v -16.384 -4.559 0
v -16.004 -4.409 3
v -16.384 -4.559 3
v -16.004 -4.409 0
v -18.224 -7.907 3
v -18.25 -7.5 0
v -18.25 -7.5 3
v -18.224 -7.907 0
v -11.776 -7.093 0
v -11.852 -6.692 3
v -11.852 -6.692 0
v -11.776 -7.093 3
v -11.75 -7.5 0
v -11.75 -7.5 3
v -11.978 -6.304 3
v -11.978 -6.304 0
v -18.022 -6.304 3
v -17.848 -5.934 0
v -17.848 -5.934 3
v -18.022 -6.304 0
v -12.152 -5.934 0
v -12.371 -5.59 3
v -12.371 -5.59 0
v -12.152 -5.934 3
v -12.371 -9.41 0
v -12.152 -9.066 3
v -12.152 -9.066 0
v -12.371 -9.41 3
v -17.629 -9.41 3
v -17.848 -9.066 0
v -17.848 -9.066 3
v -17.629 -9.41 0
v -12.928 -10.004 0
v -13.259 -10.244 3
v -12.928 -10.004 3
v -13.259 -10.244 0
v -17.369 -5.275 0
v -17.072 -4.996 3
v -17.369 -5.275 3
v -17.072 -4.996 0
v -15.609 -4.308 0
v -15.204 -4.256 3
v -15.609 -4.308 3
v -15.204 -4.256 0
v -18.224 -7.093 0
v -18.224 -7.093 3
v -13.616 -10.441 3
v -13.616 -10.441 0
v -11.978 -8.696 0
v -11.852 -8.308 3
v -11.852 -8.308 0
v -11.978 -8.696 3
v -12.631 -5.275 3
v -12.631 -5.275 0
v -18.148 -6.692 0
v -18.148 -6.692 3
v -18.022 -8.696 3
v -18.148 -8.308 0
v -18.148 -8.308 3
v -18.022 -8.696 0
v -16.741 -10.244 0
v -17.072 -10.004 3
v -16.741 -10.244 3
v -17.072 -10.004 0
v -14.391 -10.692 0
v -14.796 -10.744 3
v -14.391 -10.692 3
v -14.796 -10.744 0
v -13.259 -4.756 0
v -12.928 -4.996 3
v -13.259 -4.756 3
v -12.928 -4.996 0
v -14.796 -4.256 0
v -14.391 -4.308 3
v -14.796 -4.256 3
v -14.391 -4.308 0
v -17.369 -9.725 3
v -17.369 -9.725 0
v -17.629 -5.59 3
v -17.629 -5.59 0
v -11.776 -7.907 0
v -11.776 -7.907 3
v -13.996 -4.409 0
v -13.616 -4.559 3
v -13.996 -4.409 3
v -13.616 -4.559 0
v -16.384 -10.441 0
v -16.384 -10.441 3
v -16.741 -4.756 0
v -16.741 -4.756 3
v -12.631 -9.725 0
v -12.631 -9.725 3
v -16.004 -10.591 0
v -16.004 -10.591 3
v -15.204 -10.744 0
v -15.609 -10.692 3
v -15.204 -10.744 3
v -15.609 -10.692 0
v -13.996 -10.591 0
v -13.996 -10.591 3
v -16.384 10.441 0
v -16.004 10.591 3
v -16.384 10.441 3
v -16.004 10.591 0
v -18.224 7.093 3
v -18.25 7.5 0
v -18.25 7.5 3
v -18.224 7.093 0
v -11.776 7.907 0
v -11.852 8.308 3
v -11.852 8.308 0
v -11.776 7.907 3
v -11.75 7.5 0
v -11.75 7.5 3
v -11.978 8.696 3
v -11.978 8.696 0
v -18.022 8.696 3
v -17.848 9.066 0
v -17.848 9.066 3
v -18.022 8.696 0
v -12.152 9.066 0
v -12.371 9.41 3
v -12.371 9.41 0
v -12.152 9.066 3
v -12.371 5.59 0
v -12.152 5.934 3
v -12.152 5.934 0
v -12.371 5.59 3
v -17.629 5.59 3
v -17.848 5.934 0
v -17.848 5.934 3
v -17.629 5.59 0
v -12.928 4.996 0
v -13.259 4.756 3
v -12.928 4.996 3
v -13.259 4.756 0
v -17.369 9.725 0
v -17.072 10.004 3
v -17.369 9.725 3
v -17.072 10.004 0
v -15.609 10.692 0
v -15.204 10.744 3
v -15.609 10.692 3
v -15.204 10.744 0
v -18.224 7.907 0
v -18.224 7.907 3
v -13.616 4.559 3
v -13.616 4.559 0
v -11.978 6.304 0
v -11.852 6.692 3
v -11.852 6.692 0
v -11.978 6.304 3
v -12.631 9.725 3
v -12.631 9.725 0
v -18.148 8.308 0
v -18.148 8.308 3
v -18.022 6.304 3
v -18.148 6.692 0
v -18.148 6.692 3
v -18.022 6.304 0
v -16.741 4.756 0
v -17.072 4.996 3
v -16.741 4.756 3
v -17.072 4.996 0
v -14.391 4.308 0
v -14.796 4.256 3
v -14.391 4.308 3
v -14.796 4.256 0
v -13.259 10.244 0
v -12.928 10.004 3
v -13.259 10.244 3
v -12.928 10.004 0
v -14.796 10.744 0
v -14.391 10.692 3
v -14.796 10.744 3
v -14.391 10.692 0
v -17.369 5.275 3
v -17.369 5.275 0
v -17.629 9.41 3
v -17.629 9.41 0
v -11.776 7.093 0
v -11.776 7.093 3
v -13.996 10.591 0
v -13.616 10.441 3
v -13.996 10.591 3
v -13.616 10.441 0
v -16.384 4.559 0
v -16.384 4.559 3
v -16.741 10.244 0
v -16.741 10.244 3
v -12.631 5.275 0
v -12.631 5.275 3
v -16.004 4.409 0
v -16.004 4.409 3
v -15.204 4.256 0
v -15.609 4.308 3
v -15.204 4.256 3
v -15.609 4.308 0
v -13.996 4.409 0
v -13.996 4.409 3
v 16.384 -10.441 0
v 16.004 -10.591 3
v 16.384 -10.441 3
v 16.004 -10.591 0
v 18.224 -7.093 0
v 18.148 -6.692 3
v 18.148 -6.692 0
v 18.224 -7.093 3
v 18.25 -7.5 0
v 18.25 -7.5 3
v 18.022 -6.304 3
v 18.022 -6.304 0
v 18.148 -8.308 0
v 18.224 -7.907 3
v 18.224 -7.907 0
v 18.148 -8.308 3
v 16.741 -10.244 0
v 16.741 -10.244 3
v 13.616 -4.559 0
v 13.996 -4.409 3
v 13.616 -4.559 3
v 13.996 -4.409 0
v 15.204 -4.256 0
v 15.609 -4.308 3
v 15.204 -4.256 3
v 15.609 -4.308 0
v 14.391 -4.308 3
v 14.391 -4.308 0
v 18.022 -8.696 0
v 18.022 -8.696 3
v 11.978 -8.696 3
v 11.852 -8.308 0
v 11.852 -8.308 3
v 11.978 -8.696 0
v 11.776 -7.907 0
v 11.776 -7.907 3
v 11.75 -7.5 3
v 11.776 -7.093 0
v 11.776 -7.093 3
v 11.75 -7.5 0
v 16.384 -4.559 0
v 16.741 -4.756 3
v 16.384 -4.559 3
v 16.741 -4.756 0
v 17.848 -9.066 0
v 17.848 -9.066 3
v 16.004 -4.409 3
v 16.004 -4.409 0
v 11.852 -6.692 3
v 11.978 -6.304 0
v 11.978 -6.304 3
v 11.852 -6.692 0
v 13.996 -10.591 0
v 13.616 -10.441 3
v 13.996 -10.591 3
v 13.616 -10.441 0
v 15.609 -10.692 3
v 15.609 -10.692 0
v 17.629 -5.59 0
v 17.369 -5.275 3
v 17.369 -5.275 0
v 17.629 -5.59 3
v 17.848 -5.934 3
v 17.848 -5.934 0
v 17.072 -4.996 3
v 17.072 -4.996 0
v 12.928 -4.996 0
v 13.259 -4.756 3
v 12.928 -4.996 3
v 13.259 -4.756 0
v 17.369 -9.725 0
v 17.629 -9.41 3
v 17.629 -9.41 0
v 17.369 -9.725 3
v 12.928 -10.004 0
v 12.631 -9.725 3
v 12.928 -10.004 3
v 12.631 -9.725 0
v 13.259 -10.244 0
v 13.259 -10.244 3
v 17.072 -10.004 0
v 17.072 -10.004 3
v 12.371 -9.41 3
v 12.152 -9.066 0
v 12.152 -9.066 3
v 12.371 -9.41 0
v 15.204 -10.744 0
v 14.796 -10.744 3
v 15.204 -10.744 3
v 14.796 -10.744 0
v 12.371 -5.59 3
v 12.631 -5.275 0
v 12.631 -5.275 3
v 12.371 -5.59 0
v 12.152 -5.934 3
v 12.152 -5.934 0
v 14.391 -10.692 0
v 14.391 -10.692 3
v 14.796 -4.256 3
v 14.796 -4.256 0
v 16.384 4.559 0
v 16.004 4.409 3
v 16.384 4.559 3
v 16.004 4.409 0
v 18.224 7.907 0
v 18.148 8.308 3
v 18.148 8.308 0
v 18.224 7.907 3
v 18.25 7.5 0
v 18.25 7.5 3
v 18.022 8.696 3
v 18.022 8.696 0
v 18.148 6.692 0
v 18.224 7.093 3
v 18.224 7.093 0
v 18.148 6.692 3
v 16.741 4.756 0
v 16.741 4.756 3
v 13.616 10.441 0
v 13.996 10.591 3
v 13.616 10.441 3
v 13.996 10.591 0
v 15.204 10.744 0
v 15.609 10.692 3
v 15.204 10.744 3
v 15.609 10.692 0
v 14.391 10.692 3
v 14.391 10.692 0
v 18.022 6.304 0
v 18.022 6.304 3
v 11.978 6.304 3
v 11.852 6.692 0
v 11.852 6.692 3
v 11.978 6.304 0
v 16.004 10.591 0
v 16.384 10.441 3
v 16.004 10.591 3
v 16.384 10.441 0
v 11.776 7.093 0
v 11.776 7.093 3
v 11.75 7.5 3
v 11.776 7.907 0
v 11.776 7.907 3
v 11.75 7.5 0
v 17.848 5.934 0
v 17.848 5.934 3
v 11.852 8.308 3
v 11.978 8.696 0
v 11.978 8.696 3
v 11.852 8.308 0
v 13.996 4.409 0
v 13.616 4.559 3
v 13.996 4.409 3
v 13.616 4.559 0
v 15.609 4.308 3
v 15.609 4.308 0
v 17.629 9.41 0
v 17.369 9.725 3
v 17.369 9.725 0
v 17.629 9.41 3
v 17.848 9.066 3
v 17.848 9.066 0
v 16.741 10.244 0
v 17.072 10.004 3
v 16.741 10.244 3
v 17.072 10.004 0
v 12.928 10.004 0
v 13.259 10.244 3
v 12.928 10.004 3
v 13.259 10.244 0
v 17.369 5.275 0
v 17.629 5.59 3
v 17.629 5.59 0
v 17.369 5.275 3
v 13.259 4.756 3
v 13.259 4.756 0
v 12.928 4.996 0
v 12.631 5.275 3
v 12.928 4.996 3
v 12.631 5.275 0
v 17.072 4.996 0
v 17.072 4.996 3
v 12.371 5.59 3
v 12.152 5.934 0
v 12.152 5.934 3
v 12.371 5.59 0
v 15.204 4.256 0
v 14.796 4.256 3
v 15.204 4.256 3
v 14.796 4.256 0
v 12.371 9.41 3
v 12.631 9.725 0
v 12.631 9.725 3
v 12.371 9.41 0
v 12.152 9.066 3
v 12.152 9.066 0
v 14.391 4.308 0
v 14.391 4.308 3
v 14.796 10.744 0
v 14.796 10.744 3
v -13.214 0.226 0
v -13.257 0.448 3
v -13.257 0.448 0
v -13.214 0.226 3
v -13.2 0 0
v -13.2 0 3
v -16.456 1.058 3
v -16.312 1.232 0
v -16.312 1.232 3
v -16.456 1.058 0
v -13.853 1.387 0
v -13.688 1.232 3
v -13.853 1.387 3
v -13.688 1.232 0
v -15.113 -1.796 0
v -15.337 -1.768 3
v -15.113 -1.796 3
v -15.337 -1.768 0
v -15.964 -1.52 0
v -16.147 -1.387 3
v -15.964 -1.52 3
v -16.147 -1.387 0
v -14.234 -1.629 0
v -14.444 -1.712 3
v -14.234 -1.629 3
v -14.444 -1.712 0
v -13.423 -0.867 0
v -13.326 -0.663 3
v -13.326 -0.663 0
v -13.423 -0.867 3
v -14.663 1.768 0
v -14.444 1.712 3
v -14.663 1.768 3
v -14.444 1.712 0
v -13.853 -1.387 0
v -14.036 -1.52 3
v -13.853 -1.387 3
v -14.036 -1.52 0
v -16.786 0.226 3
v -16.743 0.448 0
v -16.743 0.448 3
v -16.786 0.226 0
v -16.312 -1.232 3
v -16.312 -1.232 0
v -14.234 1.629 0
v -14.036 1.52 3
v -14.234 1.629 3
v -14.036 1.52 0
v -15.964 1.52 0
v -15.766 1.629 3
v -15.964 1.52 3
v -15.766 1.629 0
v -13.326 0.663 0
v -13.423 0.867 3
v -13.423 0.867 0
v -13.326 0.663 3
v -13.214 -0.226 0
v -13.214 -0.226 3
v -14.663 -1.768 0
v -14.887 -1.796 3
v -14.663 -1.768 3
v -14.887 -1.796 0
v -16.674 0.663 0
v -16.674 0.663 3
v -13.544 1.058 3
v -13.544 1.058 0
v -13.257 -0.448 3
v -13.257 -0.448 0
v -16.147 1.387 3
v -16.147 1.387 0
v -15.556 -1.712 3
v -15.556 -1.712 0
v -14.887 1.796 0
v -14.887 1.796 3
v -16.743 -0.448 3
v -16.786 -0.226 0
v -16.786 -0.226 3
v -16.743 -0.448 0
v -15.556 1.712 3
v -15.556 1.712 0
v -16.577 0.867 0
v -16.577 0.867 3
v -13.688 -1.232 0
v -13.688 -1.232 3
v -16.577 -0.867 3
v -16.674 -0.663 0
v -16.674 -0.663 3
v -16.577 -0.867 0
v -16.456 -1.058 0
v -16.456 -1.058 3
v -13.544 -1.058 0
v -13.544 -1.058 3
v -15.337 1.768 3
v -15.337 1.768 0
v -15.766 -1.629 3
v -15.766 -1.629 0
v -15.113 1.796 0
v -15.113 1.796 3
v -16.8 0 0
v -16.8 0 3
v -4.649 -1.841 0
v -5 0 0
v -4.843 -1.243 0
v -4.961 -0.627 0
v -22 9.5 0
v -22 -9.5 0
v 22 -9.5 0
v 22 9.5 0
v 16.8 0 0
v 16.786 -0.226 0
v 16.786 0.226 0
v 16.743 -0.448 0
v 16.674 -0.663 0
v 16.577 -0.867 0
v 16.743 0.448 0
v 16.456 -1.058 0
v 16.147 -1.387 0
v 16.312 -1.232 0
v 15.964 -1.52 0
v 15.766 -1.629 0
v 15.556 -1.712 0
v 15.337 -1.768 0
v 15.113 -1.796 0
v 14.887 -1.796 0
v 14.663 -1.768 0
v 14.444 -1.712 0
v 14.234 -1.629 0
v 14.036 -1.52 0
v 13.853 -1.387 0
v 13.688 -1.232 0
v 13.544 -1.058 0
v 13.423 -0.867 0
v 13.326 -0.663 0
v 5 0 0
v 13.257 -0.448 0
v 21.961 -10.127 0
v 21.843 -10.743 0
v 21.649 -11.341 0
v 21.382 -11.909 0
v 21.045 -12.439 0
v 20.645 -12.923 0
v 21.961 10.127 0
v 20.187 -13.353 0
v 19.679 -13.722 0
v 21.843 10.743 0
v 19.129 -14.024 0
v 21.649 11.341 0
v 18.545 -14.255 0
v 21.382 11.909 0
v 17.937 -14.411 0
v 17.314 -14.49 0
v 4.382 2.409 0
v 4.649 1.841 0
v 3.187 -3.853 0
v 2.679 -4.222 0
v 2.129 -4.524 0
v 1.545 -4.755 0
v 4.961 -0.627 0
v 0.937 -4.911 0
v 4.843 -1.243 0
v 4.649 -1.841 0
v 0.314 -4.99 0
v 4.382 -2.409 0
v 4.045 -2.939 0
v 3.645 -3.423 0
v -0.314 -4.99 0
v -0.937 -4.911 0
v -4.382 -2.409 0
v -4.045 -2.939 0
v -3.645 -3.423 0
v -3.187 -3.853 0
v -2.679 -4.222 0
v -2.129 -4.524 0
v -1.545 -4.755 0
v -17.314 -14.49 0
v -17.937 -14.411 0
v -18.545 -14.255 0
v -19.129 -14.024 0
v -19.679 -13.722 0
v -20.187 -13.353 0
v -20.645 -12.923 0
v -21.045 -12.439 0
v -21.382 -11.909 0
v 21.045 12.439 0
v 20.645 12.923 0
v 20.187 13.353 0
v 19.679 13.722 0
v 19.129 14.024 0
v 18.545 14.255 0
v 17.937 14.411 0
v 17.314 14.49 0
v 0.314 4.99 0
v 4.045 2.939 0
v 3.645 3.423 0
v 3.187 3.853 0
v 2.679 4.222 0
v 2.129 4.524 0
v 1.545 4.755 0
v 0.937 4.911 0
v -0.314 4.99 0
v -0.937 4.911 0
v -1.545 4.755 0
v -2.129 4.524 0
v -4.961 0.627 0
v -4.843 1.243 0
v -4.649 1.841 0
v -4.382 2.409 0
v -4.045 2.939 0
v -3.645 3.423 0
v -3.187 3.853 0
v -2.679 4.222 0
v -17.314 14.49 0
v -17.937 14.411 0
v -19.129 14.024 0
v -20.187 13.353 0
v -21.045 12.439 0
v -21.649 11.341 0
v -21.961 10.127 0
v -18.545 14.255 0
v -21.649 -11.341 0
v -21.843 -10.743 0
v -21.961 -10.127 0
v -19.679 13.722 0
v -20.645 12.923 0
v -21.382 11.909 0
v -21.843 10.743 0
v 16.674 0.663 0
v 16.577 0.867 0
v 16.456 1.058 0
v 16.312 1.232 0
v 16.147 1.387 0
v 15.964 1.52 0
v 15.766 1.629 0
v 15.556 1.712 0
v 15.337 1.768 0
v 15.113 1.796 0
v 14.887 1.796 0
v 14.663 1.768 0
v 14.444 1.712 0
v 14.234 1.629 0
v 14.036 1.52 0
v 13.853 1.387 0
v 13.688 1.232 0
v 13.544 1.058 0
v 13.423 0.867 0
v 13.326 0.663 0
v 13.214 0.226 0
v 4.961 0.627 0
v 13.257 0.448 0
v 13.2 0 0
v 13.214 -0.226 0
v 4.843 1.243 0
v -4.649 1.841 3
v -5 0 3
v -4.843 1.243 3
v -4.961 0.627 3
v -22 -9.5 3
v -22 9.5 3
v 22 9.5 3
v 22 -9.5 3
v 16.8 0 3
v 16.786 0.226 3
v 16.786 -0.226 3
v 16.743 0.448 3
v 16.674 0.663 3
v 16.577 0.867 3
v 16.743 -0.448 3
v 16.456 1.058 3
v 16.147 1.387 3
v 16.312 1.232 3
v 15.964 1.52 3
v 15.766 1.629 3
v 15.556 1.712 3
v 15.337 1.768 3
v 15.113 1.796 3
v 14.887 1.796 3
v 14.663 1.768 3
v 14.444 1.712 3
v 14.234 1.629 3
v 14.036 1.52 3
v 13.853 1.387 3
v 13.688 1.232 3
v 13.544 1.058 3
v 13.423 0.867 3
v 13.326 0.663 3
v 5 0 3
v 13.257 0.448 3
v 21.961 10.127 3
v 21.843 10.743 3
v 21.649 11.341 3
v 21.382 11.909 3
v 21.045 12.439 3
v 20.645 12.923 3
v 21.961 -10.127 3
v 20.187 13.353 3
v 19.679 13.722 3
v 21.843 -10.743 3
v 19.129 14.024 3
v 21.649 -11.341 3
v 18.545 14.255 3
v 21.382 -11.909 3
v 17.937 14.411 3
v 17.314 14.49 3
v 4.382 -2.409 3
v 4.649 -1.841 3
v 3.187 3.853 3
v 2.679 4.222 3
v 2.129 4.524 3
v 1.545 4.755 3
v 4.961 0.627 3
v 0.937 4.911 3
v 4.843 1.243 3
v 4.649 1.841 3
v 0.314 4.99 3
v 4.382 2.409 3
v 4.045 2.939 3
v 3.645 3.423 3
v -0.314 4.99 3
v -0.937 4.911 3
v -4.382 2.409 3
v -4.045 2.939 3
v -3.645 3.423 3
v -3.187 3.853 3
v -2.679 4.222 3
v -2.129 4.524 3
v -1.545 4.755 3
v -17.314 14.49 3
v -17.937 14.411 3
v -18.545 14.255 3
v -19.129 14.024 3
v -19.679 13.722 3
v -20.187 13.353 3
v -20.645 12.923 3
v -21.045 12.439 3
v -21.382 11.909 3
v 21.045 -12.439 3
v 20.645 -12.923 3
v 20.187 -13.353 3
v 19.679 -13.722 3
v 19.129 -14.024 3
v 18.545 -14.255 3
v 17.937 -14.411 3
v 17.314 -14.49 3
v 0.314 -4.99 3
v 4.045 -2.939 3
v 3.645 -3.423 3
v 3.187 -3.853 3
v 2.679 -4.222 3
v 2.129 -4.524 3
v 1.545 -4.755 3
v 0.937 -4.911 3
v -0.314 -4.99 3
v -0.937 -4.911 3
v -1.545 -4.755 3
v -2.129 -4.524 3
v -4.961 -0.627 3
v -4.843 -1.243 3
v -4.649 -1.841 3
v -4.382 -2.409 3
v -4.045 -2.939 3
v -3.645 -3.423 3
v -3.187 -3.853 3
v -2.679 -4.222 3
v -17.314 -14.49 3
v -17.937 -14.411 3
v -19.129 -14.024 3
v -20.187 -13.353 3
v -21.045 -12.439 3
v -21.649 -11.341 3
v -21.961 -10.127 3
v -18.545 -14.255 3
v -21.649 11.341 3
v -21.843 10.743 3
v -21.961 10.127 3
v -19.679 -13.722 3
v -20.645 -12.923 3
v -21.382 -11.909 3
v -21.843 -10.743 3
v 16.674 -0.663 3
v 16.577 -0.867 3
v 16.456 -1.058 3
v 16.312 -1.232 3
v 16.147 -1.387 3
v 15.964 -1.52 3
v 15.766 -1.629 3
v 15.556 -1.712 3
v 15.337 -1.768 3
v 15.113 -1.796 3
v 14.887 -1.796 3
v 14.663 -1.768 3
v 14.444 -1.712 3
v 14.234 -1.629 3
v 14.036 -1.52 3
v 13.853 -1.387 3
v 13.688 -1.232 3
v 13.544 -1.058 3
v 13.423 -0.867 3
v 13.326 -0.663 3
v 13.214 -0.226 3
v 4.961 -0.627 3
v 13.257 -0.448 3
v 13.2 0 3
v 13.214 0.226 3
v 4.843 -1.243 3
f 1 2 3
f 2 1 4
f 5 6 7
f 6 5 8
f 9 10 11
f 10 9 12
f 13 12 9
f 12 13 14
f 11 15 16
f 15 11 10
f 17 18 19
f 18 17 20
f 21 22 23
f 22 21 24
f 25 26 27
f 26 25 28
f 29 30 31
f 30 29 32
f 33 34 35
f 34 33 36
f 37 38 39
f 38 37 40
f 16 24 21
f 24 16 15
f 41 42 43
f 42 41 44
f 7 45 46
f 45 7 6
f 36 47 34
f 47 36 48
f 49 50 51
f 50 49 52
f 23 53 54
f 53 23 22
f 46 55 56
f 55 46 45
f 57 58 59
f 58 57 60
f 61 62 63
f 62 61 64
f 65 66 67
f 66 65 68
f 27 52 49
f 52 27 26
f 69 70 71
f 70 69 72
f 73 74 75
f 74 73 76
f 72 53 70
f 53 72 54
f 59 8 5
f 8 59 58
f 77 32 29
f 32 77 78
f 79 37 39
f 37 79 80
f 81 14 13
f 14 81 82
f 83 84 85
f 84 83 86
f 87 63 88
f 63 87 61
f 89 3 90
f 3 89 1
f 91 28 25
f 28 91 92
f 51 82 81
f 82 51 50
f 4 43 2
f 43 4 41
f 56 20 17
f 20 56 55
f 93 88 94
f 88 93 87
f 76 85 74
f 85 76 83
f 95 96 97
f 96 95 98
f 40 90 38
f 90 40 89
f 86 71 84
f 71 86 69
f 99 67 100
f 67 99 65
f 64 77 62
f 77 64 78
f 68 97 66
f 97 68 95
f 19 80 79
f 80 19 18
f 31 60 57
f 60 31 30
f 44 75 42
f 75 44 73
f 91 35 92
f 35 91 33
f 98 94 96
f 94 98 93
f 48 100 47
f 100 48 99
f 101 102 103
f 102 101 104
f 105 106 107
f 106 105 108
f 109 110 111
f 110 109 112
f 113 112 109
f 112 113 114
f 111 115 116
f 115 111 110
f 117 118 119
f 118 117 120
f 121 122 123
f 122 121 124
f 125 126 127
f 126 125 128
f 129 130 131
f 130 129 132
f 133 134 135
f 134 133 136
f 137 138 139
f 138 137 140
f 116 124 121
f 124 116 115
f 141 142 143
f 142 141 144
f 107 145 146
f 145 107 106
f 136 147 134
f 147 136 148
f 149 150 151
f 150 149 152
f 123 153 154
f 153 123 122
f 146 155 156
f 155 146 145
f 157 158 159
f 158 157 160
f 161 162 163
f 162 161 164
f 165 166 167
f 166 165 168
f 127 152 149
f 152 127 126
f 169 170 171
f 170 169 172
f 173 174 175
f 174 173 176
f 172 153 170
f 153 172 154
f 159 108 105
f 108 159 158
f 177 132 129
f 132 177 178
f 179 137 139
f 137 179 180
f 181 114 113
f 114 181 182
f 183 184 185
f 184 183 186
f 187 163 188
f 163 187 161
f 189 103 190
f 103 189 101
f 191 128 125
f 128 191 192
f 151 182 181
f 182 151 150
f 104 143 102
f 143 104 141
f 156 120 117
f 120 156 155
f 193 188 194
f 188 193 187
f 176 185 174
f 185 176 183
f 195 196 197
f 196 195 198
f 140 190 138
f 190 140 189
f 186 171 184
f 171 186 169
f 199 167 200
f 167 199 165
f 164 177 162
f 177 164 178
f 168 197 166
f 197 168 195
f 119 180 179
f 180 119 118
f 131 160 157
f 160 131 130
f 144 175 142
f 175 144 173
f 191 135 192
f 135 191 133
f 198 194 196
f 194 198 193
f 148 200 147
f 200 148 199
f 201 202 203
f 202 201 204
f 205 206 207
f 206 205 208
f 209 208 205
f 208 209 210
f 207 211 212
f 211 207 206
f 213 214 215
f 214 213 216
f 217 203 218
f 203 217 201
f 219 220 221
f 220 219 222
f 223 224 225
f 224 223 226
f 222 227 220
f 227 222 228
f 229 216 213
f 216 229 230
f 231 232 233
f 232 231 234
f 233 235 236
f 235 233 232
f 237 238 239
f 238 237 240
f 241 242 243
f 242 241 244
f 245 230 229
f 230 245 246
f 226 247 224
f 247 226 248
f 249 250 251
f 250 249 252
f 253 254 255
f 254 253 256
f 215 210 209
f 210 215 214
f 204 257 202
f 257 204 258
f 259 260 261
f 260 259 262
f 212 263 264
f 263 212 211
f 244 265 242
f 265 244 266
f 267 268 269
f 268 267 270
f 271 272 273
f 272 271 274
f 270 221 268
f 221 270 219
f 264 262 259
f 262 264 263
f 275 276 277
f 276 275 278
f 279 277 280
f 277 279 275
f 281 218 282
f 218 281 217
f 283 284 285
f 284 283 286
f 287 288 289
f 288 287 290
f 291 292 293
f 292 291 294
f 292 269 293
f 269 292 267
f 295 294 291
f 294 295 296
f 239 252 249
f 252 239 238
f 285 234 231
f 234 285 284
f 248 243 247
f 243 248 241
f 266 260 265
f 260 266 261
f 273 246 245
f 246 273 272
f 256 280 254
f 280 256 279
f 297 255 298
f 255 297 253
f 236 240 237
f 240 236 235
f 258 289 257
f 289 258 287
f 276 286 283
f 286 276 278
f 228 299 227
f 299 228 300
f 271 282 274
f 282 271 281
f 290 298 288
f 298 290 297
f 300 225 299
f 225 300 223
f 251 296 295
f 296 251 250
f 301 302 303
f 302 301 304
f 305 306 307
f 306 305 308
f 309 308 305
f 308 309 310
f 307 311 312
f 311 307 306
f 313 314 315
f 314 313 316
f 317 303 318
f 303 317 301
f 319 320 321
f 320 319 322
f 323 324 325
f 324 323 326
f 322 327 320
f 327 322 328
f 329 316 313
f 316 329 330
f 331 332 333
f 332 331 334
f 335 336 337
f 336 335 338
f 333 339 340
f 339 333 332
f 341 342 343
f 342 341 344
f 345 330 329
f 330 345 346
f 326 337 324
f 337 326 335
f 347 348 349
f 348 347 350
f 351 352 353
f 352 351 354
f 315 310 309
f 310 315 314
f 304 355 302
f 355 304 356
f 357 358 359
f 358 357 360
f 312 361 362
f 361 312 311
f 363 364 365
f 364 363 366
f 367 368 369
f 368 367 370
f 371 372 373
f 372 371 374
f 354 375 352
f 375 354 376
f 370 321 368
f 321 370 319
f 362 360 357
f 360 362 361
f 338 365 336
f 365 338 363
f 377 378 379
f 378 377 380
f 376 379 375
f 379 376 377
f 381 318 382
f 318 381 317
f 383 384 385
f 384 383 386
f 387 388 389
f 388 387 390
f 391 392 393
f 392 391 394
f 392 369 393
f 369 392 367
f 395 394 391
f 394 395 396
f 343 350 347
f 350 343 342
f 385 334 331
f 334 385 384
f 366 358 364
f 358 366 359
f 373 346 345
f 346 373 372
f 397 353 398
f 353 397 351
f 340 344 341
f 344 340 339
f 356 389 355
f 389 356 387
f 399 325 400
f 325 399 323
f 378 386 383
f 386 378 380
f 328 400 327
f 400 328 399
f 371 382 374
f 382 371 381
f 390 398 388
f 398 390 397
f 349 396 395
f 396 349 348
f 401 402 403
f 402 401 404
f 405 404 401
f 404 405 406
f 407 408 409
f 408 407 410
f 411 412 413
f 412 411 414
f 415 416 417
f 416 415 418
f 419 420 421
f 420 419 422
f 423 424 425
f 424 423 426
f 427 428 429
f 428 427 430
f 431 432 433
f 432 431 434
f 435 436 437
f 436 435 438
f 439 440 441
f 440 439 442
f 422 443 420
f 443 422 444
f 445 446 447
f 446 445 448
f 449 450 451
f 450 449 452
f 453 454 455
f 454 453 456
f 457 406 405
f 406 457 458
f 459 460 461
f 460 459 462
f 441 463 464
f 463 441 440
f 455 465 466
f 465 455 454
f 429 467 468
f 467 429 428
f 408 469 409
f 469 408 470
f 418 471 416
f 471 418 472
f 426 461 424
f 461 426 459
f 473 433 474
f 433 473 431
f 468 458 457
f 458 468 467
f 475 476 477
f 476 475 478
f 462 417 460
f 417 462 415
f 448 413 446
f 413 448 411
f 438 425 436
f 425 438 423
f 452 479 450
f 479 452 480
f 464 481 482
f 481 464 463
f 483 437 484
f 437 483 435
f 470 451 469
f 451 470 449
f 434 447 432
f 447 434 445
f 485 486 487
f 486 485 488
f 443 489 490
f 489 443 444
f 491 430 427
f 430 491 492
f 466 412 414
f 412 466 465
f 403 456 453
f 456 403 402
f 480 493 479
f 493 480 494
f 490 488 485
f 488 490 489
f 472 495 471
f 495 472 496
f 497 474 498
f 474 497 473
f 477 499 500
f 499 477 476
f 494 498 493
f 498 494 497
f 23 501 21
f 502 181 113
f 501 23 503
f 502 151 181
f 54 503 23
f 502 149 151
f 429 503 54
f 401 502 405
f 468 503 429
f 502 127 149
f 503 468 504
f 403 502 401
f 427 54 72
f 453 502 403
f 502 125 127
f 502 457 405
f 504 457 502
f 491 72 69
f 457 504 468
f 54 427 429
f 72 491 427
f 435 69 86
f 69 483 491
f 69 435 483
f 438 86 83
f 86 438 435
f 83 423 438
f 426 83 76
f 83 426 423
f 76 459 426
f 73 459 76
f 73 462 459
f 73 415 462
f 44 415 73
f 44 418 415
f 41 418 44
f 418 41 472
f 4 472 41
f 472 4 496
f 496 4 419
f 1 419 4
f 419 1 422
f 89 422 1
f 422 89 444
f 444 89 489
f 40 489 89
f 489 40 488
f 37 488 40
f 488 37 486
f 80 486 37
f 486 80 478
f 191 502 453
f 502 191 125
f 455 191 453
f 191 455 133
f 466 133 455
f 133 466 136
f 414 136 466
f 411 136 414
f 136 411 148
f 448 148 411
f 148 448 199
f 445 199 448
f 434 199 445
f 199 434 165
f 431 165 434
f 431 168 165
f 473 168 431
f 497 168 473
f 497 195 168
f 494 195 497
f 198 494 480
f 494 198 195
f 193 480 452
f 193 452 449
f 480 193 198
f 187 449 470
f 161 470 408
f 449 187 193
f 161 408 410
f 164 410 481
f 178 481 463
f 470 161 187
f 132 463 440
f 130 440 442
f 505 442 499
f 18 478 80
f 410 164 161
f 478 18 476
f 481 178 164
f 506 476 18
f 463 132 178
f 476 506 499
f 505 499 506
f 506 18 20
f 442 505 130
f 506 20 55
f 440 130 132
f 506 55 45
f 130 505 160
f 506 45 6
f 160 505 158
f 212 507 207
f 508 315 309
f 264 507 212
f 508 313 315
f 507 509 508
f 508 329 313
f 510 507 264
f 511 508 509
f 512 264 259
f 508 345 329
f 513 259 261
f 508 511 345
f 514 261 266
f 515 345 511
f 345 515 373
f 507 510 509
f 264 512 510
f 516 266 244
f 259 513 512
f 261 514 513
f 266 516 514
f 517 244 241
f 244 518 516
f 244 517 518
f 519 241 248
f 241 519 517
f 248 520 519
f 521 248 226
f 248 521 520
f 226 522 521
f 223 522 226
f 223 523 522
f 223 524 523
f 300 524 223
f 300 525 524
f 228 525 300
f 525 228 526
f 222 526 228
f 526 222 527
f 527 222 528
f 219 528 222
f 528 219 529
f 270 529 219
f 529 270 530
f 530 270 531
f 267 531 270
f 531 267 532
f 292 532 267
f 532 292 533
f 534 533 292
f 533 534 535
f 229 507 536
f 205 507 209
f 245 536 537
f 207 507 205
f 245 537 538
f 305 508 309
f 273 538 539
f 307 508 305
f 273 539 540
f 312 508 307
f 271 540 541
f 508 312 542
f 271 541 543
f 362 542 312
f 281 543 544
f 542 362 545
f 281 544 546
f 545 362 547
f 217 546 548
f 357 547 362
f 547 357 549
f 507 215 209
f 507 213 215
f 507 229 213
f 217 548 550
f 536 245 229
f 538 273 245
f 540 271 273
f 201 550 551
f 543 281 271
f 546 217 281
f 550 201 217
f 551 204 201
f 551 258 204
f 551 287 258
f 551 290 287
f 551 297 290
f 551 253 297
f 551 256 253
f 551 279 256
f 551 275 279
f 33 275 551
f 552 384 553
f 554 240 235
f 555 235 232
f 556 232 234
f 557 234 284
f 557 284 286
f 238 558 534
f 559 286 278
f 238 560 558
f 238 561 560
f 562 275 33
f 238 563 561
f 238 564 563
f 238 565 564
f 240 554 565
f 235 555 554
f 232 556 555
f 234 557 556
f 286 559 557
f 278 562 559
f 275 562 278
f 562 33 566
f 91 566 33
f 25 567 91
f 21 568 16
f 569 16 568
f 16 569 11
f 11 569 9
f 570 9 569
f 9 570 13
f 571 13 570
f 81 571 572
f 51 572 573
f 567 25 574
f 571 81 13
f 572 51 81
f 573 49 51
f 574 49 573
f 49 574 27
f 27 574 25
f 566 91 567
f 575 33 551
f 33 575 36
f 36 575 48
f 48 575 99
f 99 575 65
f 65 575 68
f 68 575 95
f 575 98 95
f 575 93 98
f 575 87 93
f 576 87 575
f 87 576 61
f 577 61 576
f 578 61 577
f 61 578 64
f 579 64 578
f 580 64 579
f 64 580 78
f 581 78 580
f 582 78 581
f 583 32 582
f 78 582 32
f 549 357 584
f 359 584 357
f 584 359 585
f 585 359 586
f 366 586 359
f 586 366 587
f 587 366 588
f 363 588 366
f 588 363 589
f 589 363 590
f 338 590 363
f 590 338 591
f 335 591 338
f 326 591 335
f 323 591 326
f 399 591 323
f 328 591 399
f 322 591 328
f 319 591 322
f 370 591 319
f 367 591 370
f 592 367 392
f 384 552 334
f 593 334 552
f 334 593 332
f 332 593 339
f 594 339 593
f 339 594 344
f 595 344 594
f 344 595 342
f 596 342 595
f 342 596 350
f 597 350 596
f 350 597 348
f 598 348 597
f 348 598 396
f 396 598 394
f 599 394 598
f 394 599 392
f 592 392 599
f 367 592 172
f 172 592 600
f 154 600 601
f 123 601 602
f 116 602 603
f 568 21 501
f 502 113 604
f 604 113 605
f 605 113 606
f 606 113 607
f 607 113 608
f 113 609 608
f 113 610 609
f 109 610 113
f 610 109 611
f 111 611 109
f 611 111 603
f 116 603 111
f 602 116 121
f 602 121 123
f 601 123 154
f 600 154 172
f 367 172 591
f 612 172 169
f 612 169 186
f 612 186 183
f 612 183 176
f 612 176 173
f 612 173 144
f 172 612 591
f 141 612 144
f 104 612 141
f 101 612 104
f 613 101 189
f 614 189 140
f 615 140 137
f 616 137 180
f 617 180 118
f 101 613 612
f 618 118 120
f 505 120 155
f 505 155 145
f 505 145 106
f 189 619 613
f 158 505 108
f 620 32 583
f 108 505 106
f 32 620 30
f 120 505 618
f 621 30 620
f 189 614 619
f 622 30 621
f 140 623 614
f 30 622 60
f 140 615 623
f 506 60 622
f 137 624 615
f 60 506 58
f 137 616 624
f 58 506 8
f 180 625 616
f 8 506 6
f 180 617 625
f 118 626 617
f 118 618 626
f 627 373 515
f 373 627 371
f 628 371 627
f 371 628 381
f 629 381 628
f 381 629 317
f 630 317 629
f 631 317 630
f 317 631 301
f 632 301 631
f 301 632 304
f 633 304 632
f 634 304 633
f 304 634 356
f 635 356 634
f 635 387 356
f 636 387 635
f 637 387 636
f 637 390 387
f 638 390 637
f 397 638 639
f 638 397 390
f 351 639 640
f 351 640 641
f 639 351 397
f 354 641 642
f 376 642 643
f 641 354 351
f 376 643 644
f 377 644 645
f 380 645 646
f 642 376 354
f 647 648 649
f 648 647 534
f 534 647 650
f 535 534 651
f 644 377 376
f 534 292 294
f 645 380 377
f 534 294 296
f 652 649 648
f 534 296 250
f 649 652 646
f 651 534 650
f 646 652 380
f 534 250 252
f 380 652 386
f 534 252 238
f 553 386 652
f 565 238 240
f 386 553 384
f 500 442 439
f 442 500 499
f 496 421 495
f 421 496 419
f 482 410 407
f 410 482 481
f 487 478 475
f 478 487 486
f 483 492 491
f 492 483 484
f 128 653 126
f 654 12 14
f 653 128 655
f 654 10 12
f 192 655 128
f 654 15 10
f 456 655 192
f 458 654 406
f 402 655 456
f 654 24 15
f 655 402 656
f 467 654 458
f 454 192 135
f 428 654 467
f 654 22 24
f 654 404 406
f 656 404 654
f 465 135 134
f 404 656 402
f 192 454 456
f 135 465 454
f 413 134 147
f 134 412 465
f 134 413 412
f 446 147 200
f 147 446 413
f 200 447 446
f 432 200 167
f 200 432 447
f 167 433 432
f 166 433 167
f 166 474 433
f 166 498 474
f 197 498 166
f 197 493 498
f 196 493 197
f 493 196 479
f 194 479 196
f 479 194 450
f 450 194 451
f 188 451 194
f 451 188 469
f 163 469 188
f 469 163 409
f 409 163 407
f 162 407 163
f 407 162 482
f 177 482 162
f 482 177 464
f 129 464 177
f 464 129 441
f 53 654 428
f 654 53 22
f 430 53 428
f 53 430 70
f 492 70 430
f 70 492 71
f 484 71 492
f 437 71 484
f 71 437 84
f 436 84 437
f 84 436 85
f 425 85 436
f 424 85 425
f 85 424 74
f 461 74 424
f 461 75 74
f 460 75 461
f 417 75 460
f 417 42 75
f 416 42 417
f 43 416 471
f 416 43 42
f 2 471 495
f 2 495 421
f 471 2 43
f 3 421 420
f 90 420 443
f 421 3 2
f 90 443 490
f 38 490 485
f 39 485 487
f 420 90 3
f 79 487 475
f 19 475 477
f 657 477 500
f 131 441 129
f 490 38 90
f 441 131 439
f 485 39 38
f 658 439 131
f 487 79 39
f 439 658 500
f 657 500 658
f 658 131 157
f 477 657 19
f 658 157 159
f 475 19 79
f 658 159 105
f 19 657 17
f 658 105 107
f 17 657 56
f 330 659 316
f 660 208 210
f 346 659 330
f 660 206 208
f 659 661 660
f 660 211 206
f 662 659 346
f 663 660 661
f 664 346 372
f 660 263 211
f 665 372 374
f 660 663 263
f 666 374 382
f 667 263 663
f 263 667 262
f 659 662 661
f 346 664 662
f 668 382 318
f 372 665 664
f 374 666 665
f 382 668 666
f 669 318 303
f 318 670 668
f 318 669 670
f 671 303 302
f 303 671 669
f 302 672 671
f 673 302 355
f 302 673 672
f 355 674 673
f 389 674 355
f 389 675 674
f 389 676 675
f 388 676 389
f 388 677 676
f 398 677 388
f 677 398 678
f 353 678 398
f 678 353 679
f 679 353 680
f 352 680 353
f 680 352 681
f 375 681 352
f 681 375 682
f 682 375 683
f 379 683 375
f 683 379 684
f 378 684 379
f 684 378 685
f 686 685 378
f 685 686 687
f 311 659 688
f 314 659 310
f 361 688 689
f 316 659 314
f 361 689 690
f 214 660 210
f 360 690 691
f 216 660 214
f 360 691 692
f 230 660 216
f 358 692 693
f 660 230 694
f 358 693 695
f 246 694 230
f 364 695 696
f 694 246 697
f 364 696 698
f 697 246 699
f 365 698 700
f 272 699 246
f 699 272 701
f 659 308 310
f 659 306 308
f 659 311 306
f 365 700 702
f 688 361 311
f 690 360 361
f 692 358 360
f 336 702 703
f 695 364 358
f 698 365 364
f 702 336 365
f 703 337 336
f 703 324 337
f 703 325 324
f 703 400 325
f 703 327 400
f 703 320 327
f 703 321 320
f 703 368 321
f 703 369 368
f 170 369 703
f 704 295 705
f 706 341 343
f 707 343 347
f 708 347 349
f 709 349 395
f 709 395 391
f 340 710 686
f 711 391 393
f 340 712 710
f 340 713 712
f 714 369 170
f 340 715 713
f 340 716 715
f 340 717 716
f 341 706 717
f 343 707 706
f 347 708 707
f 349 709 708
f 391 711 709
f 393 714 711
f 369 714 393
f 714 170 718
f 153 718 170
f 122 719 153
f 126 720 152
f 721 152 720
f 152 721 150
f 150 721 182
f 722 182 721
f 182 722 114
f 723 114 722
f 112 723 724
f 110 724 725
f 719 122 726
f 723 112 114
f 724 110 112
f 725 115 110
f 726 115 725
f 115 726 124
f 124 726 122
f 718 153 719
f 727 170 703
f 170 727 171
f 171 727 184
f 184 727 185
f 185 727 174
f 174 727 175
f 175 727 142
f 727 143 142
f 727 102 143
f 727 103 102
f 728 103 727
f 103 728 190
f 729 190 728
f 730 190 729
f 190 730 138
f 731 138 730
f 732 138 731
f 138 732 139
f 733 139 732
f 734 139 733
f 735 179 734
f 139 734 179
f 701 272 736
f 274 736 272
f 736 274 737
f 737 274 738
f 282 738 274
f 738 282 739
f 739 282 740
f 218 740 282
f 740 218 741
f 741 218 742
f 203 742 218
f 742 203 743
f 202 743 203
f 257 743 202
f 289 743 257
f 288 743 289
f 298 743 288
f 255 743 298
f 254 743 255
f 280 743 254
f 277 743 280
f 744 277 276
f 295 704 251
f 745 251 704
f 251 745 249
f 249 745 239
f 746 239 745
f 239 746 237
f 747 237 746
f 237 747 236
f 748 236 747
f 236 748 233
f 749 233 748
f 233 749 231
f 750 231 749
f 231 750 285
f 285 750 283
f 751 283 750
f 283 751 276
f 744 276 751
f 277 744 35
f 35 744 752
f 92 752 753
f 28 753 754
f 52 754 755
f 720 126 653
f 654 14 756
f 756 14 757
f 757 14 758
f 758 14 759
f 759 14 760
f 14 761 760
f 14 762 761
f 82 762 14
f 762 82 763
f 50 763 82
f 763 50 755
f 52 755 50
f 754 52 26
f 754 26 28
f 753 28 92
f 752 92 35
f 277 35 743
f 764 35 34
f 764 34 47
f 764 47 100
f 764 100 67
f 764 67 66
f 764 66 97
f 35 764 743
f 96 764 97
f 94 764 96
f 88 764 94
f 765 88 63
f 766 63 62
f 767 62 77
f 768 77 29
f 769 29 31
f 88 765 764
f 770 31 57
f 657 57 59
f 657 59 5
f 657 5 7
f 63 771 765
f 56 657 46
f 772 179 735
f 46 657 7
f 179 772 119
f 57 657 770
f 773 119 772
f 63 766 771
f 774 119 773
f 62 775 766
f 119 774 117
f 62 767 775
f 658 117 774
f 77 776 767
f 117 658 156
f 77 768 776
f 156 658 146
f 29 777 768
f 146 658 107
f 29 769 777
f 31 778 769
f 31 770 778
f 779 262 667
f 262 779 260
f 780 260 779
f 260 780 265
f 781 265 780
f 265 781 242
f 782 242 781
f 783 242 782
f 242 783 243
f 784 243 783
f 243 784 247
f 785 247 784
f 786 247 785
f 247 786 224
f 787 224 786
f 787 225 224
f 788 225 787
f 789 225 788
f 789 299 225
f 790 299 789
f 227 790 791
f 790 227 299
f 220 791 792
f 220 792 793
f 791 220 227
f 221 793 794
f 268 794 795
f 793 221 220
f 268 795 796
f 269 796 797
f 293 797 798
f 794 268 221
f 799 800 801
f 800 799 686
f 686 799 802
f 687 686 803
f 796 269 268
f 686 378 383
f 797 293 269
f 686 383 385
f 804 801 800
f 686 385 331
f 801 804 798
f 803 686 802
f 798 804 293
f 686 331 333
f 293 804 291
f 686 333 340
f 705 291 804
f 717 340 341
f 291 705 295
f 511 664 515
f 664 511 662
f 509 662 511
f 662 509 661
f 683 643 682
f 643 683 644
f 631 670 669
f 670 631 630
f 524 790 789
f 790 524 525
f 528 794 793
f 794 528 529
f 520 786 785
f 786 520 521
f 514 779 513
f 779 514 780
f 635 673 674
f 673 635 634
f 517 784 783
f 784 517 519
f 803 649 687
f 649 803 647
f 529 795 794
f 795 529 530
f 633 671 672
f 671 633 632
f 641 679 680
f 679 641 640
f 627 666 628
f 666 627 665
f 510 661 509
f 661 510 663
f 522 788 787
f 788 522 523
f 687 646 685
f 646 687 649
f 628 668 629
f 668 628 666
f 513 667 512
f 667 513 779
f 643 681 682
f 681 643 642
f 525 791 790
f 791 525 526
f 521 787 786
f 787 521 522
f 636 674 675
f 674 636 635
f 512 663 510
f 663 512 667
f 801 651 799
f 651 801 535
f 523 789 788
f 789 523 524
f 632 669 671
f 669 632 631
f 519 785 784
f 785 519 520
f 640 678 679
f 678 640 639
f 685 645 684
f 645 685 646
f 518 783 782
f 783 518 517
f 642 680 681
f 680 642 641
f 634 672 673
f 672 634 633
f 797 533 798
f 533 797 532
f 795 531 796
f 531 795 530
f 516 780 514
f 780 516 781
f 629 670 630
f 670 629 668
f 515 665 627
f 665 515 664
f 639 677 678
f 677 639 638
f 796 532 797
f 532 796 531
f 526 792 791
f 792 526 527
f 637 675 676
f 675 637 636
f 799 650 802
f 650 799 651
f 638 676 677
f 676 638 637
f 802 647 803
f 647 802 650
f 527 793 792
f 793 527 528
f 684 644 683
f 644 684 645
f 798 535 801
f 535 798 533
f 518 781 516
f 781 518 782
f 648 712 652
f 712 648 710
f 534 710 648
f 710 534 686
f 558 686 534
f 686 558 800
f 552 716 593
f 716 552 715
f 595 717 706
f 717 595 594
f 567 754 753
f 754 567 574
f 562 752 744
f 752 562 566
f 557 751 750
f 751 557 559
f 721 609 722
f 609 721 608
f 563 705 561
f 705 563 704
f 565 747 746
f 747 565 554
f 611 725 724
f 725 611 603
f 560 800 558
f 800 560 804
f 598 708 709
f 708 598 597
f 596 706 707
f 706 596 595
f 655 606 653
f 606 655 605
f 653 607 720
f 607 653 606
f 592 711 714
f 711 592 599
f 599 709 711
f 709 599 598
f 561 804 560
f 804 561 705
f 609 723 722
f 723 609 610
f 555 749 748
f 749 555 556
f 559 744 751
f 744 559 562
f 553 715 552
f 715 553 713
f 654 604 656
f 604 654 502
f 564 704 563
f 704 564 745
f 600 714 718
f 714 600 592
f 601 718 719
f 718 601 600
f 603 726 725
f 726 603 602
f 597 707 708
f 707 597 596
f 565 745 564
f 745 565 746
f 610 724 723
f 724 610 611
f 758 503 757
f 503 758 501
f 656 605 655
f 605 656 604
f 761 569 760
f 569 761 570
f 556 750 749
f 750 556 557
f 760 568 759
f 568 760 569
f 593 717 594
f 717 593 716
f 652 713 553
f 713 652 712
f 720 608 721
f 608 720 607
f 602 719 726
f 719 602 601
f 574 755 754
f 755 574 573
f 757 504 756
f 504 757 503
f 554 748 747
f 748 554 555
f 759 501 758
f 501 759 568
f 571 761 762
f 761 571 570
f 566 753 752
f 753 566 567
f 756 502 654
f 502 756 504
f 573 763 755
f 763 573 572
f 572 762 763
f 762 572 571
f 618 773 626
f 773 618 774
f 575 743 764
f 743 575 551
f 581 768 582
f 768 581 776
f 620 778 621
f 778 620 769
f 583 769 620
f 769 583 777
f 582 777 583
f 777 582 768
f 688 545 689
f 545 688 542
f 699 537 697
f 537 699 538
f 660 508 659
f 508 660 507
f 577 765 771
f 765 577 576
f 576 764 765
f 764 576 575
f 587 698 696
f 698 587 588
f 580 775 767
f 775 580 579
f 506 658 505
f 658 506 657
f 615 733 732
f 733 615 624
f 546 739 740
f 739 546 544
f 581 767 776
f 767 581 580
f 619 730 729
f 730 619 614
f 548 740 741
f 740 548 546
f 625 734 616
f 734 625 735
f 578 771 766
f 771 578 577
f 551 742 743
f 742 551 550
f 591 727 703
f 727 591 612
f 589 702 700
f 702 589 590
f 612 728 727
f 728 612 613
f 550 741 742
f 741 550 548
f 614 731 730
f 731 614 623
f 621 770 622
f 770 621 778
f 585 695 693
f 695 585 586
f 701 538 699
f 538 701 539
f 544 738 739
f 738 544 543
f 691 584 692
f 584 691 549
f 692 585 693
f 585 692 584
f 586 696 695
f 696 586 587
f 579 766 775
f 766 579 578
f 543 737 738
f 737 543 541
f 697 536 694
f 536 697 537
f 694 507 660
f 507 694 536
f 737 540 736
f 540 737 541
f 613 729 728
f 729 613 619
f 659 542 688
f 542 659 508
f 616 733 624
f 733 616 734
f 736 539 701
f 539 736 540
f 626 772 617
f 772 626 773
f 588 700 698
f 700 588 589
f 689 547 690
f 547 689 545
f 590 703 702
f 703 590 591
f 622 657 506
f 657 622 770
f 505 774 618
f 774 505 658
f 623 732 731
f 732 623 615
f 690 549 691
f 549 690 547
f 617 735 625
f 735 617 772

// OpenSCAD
$fn = 50;


difference() {
	union() {
		hull() {
			translate(v = [-17.0000000000, 9.5000000000, 0]) {
				cylinder(h = 3, r = 5);
			}
			translate(v = [17.0000000000, 9.5000000000, 0]) {
				cylinder(h = 3, r = 5);
			}
			translate(v = [-17.0000000000, -9.5000000000, 0]) {
				cylinder(h = 3, r = 5);
			}
			translate(v = [17.0000000000, -9.5000000000, 0]) {
				cylinder(h = 3, r = 5);
			}
		}
	}
	union() {
		#translate(v = [-15.0000000000, -7.5000000000, 0]) {
			cylinder(h = 3, r = 3.2500000000);
		}
		#translate(v = [-15.0000000000, 7.5000000000, 0]) {
			cylinder(h = 3, r = 3.2500000000);
		}
		#translate(v = [15.0000000000, -7.5000000000, 0]) {
			cylinder(h = 3, r = 3.2500000000);
		}
		#translate(v = [15.0000000000, 7.5000000000, 0]) {
			cylinder(h = 3, r = 3.2500000000);
		}
		#translate(v = [-15.0000000000, -7.5000000000, -100.0000000000]) {
			cylinder(h = 200, r = 3.2500000000);
		}
		#translate(v = [-15.0000000000, 7.5000000000, -100.0000000000]) {
			cylinder(h = 200, r = 3.2500000000);
		}
		#translate(v = [15.0000000000, -7.5000000000, -100.0000000000]) {
			cylinder(h = 200, r = 3.2500000000);
		}
		#translate(v = [15.0000000000, 7.5000000000, -100.0000000000]) {
			cylinder(h = 200, r = 3.2500000000);
		}
		#translate(v = [-15.0000000000, -7.5000000000, 0]) {
			cylinder(h = 3, r = 1.8000000000);
		}
		#translate(v = [-15.0000000000, 0.0000000000, 0]) {
			cylinder(h = 3, r = 1.8000000000);
		}
		#translate(v = [-15.0000000000, 7.5000000000, 0]) {
			cylinder(h = 3, r = 1.8000000000);
		}
		#translate(v = [15.0000000000, -7.5000000000, 0]) {
			cylinder(h = 3, r = 1.8000000000);
		}
		#translate(v = [15.0000000000, 0.0000000000, 0]) {
			cylinder(h = 3, r = 1.8000000000);
		}
		#translate(v = [15.0000000000, 7.5000000000, 0]) {
			cylinder(h = 3, r = 1.8000000000);
		}
		#translate(v = [-15.0000000000, -7.5000000000, 0]) {
			cylinder(h = 3, r = 1.8000000000);
		}
		#translate(v = [-15.0000000000, 0.0000000000, 0]) {
			cylinder(h = 3, r = 1.8000000000);
		}
		#translate(v = [-15.0000000000, 7.5000000000, 0]) {
			cylinder(h = 3, r = 1.8000000000);
		}
		#translate(v = [15.0000000000, -7.5000000000, 0]) {
			cylinder(h = 3, r = 1.8000000000);
		}
		#translate(v = [15.0000000000, 0.0000000000, 0]) {
			cylinder(h = 3, r = 1.8000000000);
		}
		#translate(v = [15.0000000000, 7.5000000000, 0]) {
			cylinder(h = 3, r = 1.8000000000);
		}
		#translate(v = [-15.0000000000, -7.5000000000, 0]) {
			cylinder(h = 3, r = 1.8000000000);
		}
		#translate(v = [-15.0000000000, 0.0000000000, 0]) {
			cylinder(h = 3, r = 1.8000000000);
		}
		#translate(v = [-15.0000000000, 7.5000000000, 0]) {
			cylinder(h = 3, r = 1.8000000000);
		}
		#translate(v = [15.0000000000, -7.5000000000, 0]) {
			cylinder(h = 3, r = 1.8000000000);
		}
		#translate(v = [15.0000000000, 0.0000000000, 0]) {
			cylinder(h = 3, r = 1.8000000000);
		}
		#translate(v = [15.0000000000, 7.5000000000, 0]) {
			cylinder(h = 3, r = 1.8000000000);
		}
		#cylinder(h = 3, r = 5.0000000000);
	}
}
